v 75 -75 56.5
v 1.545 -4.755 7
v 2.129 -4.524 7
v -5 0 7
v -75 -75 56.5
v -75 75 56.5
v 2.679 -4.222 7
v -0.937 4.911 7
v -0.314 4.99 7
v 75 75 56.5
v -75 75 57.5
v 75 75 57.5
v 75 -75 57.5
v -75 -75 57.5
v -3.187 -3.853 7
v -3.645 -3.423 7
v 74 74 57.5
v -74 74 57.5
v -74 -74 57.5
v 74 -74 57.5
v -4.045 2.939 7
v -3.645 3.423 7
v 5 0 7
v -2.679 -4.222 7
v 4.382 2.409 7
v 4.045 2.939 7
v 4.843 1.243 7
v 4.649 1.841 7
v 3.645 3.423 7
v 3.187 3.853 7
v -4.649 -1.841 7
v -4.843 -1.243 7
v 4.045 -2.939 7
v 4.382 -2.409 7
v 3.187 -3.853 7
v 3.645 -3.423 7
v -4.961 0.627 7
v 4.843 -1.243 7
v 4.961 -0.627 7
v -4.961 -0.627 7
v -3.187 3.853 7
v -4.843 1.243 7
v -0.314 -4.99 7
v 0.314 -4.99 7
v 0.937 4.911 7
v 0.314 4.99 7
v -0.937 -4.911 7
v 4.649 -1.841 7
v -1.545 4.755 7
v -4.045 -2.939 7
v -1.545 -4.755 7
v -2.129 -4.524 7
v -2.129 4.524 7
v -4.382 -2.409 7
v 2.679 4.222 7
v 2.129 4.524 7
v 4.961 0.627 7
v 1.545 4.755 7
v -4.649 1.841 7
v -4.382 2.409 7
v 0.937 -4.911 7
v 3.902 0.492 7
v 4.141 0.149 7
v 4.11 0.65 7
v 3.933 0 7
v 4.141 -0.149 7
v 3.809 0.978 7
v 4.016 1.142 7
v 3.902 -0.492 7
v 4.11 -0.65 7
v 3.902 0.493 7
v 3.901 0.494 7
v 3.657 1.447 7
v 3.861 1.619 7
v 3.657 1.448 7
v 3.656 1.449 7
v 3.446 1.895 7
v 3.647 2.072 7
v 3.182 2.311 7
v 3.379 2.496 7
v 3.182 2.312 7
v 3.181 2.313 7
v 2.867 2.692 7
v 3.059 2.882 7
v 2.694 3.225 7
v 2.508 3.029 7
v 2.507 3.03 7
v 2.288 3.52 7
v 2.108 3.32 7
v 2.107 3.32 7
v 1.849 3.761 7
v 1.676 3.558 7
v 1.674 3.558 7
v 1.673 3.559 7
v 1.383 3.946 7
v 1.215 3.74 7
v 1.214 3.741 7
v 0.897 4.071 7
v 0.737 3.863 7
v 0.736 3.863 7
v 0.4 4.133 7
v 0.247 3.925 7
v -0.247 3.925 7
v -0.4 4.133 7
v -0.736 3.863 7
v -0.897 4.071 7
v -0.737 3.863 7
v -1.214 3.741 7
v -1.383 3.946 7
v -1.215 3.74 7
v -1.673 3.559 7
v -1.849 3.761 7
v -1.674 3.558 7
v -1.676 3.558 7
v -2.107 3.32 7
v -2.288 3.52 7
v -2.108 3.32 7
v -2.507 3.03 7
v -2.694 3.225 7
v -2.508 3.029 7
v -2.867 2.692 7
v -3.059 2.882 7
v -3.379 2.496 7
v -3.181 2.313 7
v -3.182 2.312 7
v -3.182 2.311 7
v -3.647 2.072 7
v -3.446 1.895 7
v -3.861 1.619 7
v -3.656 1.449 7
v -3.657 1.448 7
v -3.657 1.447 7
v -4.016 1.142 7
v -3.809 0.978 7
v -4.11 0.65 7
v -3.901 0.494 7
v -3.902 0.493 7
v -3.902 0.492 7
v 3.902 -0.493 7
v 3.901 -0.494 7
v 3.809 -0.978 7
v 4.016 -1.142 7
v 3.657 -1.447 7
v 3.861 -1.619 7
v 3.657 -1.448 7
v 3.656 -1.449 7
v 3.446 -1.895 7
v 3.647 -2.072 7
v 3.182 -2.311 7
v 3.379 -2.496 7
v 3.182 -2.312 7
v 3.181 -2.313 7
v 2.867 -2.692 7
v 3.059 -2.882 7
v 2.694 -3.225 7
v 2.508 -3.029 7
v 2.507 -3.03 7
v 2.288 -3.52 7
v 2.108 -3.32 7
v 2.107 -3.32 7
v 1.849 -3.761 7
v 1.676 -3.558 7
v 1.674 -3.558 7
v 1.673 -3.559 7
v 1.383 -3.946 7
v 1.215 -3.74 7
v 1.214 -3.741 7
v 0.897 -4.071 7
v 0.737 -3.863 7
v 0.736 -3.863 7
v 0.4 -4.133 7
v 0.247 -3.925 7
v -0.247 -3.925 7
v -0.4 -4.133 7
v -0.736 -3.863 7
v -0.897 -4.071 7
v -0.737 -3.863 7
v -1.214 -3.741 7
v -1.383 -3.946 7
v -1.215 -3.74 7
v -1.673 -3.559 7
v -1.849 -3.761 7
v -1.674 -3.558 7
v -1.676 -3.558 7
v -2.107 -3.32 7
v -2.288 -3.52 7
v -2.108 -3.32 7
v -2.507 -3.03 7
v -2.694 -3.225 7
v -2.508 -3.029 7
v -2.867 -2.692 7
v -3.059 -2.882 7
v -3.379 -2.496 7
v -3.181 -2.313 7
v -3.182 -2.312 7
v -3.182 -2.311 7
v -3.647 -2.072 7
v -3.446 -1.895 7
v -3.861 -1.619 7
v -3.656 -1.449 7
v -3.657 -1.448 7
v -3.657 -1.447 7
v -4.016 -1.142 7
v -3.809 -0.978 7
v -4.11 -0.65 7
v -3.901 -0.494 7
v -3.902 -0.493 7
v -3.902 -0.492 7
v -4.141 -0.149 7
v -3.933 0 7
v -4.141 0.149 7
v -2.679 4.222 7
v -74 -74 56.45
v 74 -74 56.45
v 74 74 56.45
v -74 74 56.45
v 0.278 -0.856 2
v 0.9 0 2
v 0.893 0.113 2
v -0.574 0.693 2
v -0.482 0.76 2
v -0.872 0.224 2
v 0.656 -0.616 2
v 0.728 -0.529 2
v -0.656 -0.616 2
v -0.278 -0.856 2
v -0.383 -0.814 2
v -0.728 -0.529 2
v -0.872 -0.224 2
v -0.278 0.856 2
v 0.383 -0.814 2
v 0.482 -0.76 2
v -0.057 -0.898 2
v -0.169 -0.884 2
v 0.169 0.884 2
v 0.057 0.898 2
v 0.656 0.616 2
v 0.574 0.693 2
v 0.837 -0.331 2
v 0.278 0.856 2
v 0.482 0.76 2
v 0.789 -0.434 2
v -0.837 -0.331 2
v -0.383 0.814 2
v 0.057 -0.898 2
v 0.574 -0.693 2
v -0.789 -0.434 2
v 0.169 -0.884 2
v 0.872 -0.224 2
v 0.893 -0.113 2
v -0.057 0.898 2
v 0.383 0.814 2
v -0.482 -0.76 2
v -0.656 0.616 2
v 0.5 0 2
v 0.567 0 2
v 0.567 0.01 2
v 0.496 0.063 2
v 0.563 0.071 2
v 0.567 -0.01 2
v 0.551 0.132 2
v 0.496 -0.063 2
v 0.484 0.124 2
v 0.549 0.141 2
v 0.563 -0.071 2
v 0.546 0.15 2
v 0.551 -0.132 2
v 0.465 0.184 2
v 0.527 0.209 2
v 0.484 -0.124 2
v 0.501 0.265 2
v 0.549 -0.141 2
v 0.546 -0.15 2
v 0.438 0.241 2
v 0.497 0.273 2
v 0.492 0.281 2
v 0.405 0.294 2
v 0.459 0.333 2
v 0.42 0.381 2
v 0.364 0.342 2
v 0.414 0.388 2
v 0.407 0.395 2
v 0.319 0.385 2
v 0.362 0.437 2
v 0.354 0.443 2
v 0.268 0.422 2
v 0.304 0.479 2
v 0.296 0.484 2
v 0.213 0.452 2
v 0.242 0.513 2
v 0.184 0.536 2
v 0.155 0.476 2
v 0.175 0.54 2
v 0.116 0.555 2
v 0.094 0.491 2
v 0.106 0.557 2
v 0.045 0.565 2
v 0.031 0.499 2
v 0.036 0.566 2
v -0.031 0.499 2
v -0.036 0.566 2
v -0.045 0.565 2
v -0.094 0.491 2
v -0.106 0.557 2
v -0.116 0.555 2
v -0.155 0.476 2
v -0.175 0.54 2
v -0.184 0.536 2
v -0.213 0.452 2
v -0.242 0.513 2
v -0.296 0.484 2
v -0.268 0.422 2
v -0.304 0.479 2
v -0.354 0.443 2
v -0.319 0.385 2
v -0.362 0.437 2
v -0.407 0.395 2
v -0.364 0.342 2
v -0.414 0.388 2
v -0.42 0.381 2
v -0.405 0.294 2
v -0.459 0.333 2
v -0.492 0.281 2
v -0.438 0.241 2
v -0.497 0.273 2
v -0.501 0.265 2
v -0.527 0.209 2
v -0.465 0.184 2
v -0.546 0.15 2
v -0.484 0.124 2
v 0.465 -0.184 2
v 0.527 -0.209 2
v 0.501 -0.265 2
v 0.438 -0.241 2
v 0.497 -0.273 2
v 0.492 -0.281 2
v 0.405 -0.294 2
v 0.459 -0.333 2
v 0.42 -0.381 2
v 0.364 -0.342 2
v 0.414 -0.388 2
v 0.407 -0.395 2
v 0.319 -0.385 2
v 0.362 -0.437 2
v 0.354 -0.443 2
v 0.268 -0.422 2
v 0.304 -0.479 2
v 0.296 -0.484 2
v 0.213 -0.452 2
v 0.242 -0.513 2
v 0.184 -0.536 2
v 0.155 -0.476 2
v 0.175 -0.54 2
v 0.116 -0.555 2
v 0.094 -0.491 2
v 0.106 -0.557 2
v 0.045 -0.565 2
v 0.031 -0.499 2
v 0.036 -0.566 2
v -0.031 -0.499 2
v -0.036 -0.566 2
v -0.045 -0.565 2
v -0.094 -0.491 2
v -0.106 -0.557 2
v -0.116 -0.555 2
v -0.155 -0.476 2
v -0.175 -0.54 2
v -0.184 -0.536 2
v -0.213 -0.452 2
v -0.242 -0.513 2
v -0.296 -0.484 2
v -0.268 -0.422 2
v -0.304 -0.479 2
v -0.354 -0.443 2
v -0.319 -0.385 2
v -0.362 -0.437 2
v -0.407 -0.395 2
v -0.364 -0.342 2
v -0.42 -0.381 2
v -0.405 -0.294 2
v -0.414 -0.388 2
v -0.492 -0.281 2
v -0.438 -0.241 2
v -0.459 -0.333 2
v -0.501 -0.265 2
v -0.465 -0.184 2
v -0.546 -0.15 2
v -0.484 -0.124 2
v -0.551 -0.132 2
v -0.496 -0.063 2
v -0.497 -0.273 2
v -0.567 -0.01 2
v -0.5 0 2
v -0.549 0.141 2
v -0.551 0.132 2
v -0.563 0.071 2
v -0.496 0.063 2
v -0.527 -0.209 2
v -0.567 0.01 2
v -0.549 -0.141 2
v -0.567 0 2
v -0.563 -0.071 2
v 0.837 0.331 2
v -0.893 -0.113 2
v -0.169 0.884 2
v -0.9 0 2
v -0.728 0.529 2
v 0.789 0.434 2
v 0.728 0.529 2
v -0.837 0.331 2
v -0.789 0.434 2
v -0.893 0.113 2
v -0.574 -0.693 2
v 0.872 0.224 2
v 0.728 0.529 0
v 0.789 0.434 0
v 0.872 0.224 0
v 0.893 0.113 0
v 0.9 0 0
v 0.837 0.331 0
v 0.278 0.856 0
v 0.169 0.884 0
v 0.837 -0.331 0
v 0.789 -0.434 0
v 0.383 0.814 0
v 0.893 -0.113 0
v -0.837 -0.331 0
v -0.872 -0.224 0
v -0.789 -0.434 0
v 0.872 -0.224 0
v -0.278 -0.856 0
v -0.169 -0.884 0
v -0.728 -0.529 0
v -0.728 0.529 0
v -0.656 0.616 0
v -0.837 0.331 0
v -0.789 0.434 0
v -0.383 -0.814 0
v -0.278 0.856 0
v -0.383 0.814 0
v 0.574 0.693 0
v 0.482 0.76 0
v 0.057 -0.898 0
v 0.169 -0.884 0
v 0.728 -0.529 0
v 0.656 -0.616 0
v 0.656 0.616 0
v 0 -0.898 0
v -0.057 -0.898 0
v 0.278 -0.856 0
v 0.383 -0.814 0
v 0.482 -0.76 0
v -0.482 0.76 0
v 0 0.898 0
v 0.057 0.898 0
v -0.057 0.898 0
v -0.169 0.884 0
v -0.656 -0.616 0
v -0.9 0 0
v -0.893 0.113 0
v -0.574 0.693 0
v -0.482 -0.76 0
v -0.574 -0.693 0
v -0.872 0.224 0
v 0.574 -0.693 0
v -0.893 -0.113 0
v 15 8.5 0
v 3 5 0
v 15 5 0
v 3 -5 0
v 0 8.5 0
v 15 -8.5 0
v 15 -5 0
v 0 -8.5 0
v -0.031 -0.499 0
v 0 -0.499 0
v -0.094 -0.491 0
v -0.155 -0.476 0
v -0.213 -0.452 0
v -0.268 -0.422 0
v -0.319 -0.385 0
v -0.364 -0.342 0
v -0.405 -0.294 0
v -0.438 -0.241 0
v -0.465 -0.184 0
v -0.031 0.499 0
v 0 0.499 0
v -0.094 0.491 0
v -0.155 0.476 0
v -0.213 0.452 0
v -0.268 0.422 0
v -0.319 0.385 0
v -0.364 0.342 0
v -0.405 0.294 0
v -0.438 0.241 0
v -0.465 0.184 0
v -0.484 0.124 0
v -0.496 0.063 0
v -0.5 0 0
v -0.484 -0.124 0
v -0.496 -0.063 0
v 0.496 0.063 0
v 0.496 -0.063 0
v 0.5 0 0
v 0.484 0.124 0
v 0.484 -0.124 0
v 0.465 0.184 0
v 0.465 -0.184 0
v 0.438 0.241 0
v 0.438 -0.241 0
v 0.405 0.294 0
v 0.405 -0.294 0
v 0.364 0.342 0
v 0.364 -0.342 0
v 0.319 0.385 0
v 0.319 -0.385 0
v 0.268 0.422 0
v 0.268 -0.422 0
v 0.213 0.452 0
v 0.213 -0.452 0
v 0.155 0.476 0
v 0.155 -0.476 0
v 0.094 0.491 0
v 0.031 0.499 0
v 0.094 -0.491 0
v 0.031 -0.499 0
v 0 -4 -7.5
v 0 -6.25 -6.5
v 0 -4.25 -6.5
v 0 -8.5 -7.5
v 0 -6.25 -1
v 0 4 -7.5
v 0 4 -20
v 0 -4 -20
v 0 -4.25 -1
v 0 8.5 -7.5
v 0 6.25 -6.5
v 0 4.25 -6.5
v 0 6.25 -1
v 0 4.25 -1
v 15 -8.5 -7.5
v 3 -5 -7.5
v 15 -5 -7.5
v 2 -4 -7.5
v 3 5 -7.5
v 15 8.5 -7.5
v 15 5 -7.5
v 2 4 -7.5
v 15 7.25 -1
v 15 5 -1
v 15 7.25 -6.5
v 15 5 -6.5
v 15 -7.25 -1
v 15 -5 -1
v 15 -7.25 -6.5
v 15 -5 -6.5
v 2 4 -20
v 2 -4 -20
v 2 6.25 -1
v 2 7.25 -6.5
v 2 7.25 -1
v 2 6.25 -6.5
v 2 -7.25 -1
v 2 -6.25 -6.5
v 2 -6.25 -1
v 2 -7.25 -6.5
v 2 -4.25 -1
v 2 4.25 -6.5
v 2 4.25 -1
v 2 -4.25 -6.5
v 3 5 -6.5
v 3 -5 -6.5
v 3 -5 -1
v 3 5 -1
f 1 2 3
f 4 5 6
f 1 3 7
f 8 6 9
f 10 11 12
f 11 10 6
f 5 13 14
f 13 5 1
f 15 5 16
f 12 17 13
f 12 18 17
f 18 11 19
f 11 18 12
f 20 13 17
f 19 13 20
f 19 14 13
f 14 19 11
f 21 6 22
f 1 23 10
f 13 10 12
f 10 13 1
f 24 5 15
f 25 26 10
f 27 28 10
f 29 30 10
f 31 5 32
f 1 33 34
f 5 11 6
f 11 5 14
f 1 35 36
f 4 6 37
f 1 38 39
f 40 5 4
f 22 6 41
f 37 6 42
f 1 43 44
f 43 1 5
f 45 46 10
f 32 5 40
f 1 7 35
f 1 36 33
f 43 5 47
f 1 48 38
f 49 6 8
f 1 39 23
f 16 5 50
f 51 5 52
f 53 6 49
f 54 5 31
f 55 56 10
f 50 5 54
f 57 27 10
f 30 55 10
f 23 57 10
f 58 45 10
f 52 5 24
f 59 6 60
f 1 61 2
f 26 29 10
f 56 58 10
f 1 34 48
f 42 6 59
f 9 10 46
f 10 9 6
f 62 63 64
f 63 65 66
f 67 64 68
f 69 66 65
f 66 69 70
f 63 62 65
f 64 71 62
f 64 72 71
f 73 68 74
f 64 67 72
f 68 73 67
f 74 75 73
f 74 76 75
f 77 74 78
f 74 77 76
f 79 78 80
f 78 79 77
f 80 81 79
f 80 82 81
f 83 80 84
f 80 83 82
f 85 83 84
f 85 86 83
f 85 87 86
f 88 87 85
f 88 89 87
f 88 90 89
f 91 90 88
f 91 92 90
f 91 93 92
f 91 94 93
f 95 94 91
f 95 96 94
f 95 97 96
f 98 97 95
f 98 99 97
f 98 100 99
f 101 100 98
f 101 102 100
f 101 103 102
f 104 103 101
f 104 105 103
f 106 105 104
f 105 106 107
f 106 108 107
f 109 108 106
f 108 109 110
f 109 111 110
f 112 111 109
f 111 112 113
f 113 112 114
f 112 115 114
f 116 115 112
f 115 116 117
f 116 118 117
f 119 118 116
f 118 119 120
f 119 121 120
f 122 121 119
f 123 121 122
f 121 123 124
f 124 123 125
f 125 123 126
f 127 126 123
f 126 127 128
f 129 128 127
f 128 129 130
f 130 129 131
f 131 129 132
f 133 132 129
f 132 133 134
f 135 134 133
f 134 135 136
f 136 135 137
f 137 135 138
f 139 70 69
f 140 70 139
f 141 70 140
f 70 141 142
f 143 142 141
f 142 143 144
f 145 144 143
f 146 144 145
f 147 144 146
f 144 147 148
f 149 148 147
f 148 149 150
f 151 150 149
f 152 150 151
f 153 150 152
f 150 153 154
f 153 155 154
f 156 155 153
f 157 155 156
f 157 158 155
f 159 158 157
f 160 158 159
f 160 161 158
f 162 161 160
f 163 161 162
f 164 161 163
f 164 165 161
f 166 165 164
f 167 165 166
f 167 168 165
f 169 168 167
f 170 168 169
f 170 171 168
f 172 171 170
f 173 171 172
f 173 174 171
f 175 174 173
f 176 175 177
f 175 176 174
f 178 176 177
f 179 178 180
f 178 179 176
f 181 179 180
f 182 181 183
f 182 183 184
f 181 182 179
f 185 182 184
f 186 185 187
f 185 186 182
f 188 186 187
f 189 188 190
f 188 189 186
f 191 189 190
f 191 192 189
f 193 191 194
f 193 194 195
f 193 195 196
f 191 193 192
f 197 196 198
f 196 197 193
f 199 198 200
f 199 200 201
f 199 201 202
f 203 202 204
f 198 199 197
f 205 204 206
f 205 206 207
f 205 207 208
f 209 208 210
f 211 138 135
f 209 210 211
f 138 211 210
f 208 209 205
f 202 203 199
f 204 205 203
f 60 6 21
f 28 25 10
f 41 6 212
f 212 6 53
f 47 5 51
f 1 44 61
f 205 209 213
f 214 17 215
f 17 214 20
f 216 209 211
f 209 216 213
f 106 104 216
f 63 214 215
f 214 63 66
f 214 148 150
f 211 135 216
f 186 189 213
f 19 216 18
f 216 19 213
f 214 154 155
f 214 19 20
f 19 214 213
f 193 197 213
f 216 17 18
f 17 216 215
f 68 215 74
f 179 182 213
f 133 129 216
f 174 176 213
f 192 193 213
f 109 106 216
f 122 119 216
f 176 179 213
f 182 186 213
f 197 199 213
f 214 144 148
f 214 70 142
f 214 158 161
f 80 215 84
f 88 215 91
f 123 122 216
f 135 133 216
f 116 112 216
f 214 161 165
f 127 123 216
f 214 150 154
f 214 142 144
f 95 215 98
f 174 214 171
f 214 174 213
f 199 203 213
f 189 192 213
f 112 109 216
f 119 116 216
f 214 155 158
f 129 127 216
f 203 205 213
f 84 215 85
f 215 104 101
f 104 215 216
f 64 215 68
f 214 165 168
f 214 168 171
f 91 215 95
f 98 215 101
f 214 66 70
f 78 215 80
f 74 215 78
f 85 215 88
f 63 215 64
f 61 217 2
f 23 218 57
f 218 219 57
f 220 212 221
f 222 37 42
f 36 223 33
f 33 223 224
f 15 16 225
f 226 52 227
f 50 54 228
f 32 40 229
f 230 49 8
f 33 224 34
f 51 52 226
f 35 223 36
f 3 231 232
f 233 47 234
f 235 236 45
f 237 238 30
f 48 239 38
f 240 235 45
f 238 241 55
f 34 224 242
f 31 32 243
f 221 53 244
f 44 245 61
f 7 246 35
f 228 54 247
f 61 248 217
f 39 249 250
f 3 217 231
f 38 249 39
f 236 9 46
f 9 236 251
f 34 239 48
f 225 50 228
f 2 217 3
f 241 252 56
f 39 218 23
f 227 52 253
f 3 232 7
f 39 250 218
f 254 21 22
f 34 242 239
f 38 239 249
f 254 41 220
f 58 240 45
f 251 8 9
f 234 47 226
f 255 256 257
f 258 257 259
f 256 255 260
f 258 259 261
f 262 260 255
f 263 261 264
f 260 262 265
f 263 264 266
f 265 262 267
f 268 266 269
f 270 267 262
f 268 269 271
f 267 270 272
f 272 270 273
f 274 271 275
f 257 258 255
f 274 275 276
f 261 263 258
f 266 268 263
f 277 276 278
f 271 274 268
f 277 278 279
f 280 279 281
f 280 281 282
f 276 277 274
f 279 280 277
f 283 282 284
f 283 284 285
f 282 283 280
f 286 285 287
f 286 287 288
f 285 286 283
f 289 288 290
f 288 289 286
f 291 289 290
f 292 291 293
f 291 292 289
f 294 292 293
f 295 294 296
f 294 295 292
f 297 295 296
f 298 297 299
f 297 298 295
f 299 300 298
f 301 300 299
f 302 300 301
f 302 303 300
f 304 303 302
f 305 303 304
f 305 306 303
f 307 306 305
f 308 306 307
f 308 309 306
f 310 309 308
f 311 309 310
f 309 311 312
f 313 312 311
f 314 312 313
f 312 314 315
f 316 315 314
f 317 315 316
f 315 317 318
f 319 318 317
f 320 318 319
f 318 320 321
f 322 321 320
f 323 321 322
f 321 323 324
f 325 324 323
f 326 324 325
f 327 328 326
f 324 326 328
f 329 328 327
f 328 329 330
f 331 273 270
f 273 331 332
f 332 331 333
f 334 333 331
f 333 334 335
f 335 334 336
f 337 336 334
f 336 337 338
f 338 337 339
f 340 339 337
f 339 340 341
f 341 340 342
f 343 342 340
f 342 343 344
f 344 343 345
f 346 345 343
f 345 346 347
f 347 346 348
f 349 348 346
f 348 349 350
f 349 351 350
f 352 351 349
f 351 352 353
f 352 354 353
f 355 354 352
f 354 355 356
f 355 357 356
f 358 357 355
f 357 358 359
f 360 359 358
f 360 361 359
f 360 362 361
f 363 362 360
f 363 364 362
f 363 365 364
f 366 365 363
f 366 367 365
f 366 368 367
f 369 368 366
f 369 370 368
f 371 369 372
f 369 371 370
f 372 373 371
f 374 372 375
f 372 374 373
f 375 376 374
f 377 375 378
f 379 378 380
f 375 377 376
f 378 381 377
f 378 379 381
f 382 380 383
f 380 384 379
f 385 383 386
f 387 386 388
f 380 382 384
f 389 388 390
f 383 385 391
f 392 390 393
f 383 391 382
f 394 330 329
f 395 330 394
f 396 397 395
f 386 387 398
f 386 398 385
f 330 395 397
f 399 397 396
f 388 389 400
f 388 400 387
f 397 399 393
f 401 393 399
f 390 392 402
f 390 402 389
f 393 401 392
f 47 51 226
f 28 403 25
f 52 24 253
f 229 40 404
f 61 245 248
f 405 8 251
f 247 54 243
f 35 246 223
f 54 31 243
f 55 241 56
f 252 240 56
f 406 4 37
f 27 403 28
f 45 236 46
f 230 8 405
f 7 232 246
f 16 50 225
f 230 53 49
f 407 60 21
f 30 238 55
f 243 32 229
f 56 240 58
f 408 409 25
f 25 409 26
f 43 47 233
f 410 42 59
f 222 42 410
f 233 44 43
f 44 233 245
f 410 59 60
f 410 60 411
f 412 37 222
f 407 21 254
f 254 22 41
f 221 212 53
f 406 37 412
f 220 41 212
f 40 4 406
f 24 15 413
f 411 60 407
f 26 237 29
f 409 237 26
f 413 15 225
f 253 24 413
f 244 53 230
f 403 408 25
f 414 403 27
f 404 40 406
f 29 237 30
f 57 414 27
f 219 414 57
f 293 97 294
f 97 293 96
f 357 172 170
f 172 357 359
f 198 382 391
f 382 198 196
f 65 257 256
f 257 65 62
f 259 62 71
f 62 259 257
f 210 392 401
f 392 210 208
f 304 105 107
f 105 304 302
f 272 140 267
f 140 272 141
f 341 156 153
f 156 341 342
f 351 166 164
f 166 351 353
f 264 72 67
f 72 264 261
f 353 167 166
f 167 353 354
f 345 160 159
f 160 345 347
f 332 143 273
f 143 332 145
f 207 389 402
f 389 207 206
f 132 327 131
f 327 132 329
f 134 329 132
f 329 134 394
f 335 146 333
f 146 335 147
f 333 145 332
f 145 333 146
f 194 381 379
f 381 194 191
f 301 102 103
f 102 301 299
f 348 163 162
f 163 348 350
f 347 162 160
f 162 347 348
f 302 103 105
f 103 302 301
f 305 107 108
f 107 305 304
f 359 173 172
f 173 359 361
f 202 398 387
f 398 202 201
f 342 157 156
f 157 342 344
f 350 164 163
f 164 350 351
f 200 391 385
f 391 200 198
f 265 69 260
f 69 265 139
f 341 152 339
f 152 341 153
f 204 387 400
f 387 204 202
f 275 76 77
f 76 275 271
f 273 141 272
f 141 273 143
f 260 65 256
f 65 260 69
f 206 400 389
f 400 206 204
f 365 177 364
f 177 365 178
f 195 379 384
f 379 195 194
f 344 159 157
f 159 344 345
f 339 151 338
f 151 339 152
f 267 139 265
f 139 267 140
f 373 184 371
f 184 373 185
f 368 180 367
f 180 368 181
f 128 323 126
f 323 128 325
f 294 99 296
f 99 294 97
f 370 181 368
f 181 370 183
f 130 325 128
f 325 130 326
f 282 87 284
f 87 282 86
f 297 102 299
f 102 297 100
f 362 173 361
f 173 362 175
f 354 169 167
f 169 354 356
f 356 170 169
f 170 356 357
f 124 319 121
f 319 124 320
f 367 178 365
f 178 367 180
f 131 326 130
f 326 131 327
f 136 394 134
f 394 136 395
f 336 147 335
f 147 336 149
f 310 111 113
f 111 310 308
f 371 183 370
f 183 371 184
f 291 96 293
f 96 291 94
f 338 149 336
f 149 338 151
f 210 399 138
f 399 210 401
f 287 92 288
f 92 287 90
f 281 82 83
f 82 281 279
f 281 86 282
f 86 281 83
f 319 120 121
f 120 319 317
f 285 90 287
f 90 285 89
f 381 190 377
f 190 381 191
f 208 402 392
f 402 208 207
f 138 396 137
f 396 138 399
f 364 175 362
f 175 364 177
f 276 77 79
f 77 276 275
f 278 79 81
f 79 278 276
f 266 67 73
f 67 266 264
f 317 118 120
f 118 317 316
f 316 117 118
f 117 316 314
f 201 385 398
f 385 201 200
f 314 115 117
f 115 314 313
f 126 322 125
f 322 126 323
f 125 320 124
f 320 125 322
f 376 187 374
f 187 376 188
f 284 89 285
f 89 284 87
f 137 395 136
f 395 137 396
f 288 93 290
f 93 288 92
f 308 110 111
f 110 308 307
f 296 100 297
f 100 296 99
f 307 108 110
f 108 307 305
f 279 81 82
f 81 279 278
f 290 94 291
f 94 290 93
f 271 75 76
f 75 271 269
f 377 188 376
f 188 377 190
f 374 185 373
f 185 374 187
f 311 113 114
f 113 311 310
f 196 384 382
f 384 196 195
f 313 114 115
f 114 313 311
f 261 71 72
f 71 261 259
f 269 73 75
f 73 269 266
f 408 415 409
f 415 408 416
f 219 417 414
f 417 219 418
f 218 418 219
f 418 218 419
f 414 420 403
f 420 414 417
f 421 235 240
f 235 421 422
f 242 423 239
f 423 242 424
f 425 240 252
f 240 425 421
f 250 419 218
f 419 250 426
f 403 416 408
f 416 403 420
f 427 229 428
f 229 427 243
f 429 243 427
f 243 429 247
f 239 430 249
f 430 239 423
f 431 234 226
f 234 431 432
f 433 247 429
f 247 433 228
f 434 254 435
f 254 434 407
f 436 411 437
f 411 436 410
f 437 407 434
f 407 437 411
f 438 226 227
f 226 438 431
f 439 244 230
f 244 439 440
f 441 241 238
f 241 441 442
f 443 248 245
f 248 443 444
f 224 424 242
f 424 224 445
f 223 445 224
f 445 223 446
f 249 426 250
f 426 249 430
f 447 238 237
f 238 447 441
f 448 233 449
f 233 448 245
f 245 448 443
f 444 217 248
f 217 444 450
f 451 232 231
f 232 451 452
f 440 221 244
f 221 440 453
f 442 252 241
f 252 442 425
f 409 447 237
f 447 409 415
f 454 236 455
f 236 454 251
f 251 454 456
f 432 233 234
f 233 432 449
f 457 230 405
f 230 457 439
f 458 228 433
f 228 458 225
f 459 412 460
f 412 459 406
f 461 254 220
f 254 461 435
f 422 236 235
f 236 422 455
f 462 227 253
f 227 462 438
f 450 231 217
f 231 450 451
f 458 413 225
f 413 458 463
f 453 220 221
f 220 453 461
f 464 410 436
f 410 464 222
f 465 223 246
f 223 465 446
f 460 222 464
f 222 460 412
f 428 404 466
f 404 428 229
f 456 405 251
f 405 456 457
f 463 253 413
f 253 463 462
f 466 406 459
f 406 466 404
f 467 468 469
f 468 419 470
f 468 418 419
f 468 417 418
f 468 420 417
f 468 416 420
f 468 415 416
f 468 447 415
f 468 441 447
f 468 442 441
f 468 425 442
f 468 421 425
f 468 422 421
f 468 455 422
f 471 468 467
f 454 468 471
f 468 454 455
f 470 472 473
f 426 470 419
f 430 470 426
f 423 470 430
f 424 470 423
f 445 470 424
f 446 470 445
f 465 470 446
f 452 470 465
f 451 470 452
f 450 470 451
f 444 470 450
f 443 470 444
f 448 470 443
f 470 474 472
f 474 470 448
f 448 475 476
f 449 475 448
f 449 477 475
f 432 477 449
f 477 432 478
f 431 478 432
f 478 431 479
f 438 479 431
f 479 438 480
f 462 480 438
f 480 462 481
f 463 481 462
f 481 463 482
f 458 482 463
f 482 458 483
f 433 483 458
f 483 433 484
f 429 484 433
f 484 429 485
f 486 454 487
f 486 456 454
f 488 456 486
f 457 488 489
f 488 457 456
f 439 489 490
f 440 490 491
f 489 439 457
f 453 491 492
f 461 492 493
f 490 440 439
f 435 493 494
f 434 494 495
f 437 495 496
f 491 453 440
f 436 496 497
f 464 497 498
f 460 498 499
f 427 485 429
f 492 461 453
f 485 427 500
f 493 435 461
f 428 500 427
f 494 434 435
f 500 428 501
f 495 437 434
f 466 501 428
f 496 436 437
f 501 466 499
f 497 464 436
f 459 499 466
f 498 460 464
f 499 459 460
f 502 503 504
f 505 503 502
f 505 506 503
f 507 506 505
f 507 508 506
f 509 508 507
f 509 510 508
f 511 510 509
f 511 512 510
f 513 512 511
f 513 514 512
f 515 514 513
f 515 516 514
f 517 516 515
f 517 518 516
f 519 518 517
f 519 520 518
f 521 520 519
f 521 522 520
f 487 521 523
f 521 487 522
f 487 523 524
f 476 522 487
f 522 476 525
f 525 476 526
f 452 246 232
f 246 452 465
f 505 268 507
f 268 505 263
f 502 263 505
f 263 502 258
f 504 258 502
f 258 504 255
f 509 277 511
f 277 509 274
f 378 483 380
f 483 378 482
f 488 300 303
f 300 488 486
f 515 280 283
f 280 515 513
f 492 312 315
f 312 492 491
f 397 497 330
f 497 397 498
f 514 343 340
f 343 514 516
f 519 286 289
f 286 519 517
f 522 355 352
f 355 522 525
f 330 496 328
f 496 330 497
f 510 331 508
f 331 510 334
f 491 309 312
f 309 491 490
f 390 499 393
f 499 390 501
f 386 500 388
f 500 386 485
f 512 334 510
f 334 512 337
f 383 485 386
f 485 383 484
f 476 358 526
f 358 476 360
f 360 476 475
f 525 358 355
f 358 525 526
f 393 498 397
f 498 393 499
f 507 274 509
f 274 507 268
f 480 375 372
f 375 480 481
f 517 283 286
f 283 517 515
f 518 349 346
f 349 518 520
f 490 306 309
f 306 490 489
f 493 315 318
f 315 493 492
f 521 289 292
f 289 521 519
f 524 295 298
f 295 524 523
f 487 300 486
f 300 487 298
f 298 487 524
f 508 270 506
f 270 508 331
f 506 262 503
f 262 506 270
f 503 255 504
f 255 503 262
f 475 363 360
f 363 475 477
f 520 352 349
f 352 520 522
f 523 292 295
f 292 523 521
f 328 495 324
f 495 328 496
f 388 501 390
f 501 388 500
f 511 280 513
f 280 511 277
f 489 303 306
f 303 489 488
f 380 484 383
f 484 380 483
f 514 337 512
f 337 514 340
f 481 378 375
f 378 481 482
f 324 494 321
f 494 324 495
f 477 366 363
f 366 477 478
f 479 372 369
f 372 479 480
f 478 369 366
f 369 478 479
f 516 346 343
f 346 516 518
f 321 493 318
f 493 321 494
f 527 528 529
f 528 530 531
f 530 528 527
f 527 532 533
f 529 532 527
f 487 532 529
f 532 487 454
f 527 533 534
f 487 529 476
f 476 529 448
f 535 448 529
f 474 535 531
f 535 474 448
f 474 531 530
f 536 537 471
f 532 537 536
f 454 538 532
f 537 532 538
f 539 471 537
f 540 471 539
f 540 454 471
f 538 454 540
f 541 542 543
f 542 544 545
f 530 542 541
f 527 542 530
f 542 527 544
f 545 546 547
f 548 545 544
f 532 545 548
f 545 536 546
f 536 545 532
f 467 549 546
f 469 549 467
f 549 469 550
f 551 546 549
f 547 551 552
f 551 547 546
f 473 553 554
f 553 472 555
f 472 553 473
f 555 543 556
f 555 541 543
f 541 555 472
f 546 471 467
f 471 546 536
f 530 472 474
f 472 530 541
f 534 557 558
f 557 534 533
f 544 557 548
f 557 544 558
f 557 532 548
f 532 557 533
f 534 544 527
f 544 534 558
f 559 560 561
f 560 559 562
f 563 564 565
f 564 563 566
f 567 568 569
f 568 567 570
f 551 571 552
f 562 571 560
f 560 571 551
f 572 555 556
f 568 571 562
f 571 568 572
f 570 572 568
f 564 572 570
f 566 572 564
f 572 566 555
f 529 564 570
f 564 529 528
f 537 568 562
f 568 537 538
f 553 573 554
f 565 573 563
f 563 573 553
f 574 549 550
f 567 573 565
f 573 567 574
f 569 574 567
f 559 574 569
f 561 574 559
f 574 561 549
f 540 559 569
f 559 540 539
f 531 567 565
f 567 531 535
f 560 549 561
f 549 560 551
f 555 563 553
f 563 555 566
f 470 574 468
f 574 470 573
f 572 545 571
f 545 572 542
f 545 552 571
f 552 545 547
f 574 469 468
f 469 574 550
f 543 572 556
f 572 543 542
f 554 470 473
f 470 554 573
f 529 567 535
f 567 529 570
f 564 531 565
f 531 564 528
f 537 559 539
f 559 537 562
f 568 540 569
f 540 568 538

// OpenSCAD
$fn = 50;
CLEAR = 0.1;
2CLEAR = 0.2;

funnel_out = 150;
funnel_wall = 2;
funnel_height = 75;
funnel_transition = 5;
funnel_pipe_length = 2;
funnel_pipe_wall = 0.4;
funnel_pipe_in_d = 1;

funnel_out_x = funnel_out;
funnel_out_y = funnel_out;

translate([0,0,funnel_pipe_length+funnel_transition]) difference(){
    hull(){
        cylinder(1, 10/2, 10/2);
        translate([0,0,50]) cube([funnel_out_x, funnel_out_y, 1], center=true);
    }
    hull(){
        translate([0,0,-0.1]) cylinder(1.2, 8/2, 8/2);
        translate([0,0,50]) cube([funnel_out_y-funnel_wall, funnel_out_y-funnel_wall, 1.1], center=true);
    }
}
translate([0,0,funnel_pipe_length]) difference(){
    cylinder(funnel_transition, funnel_pipe_in_d/2+funnel_pipe_wall, 10/2);
    translate([0,0,-CLEAR]) cylinder(funnel_transition+2CLEAR, funnel_pipe_in_d/2, 8/2);
}
difference(){
    cylinder(funnel_pipe_length, funnel_pipe_in_d/2+funnel_pipe_wall, funnel_pipe_in_d/2+funnel_pipe_wall);
    translate([0,0,-CLEAR]) cylinder(funnel_pipe_length+2CLEAR, funnel_pipe_in_d/2, funnel_pipe_in_d/2);
}





// http://www.tme.eu/cz/Document/5744426ad4cea8b50c8f3e2cb0c9de26/EE-SX3081.pdf


sensor_width = 14 + 0.5;
sensor_lenght = 10 + 3;
sensor_thicknes = 5+0.5;

sensor_wall_border = 1;
sensor_wall_leg = 2;

sensor_leg_lenght = 20;
sensor_leg_width = 8;

translate([0,0,0]) rotate([0,180,0]){
    
    difference(){
        union(){
            translate([-sensor_lenght-sensor_wall_leg, -sensor_lenght/2-2*sensor_wall_border, 0]) cube([sensor_lenght+2*sensor_wall_border, sensor_lenght+4*sensor_wall_border, sensor_thicknes+2*sensor_wall_border]);
            translate([-sensor_wall_leg, -sensor_leg_width/2, 0]) cube([sensor_wall_leg, sensor_leg_width, sensor_leg_lenght]);
        }
        translate([-sensor_lenght-sensor_wall_leg-CLEAR, -sensor_width/2, sensor_wall_border]) cube([sensor_lenght+CLEAR, sensor_width, sensor_thicknes]); 
        translate([-sensor_lenght-sensor_wall_leg-CLEAR, -10/2, 0-CLEAR]) cube([sensor_lenght-sensor_wall_border+CLEAR, 10, sensor_thicknes+2*sensor_wall_border+2CLEAR]);  
        translate([-sensor_wall_leg-sensor_wall_border+CLEAR, -2/2 - 10.5/2, sensor_wall_border]) cube([3+2CLEAR, 2, sensor_thicknes]);   
        translate([-sensor_wall_leg-sensor_wall_border+CLEAR, -2/2 + 10.5/2, sensor_wall_border]) cube([3+2CLEAR, 2, sensor_thicknes]);  
    }
    
    
}
